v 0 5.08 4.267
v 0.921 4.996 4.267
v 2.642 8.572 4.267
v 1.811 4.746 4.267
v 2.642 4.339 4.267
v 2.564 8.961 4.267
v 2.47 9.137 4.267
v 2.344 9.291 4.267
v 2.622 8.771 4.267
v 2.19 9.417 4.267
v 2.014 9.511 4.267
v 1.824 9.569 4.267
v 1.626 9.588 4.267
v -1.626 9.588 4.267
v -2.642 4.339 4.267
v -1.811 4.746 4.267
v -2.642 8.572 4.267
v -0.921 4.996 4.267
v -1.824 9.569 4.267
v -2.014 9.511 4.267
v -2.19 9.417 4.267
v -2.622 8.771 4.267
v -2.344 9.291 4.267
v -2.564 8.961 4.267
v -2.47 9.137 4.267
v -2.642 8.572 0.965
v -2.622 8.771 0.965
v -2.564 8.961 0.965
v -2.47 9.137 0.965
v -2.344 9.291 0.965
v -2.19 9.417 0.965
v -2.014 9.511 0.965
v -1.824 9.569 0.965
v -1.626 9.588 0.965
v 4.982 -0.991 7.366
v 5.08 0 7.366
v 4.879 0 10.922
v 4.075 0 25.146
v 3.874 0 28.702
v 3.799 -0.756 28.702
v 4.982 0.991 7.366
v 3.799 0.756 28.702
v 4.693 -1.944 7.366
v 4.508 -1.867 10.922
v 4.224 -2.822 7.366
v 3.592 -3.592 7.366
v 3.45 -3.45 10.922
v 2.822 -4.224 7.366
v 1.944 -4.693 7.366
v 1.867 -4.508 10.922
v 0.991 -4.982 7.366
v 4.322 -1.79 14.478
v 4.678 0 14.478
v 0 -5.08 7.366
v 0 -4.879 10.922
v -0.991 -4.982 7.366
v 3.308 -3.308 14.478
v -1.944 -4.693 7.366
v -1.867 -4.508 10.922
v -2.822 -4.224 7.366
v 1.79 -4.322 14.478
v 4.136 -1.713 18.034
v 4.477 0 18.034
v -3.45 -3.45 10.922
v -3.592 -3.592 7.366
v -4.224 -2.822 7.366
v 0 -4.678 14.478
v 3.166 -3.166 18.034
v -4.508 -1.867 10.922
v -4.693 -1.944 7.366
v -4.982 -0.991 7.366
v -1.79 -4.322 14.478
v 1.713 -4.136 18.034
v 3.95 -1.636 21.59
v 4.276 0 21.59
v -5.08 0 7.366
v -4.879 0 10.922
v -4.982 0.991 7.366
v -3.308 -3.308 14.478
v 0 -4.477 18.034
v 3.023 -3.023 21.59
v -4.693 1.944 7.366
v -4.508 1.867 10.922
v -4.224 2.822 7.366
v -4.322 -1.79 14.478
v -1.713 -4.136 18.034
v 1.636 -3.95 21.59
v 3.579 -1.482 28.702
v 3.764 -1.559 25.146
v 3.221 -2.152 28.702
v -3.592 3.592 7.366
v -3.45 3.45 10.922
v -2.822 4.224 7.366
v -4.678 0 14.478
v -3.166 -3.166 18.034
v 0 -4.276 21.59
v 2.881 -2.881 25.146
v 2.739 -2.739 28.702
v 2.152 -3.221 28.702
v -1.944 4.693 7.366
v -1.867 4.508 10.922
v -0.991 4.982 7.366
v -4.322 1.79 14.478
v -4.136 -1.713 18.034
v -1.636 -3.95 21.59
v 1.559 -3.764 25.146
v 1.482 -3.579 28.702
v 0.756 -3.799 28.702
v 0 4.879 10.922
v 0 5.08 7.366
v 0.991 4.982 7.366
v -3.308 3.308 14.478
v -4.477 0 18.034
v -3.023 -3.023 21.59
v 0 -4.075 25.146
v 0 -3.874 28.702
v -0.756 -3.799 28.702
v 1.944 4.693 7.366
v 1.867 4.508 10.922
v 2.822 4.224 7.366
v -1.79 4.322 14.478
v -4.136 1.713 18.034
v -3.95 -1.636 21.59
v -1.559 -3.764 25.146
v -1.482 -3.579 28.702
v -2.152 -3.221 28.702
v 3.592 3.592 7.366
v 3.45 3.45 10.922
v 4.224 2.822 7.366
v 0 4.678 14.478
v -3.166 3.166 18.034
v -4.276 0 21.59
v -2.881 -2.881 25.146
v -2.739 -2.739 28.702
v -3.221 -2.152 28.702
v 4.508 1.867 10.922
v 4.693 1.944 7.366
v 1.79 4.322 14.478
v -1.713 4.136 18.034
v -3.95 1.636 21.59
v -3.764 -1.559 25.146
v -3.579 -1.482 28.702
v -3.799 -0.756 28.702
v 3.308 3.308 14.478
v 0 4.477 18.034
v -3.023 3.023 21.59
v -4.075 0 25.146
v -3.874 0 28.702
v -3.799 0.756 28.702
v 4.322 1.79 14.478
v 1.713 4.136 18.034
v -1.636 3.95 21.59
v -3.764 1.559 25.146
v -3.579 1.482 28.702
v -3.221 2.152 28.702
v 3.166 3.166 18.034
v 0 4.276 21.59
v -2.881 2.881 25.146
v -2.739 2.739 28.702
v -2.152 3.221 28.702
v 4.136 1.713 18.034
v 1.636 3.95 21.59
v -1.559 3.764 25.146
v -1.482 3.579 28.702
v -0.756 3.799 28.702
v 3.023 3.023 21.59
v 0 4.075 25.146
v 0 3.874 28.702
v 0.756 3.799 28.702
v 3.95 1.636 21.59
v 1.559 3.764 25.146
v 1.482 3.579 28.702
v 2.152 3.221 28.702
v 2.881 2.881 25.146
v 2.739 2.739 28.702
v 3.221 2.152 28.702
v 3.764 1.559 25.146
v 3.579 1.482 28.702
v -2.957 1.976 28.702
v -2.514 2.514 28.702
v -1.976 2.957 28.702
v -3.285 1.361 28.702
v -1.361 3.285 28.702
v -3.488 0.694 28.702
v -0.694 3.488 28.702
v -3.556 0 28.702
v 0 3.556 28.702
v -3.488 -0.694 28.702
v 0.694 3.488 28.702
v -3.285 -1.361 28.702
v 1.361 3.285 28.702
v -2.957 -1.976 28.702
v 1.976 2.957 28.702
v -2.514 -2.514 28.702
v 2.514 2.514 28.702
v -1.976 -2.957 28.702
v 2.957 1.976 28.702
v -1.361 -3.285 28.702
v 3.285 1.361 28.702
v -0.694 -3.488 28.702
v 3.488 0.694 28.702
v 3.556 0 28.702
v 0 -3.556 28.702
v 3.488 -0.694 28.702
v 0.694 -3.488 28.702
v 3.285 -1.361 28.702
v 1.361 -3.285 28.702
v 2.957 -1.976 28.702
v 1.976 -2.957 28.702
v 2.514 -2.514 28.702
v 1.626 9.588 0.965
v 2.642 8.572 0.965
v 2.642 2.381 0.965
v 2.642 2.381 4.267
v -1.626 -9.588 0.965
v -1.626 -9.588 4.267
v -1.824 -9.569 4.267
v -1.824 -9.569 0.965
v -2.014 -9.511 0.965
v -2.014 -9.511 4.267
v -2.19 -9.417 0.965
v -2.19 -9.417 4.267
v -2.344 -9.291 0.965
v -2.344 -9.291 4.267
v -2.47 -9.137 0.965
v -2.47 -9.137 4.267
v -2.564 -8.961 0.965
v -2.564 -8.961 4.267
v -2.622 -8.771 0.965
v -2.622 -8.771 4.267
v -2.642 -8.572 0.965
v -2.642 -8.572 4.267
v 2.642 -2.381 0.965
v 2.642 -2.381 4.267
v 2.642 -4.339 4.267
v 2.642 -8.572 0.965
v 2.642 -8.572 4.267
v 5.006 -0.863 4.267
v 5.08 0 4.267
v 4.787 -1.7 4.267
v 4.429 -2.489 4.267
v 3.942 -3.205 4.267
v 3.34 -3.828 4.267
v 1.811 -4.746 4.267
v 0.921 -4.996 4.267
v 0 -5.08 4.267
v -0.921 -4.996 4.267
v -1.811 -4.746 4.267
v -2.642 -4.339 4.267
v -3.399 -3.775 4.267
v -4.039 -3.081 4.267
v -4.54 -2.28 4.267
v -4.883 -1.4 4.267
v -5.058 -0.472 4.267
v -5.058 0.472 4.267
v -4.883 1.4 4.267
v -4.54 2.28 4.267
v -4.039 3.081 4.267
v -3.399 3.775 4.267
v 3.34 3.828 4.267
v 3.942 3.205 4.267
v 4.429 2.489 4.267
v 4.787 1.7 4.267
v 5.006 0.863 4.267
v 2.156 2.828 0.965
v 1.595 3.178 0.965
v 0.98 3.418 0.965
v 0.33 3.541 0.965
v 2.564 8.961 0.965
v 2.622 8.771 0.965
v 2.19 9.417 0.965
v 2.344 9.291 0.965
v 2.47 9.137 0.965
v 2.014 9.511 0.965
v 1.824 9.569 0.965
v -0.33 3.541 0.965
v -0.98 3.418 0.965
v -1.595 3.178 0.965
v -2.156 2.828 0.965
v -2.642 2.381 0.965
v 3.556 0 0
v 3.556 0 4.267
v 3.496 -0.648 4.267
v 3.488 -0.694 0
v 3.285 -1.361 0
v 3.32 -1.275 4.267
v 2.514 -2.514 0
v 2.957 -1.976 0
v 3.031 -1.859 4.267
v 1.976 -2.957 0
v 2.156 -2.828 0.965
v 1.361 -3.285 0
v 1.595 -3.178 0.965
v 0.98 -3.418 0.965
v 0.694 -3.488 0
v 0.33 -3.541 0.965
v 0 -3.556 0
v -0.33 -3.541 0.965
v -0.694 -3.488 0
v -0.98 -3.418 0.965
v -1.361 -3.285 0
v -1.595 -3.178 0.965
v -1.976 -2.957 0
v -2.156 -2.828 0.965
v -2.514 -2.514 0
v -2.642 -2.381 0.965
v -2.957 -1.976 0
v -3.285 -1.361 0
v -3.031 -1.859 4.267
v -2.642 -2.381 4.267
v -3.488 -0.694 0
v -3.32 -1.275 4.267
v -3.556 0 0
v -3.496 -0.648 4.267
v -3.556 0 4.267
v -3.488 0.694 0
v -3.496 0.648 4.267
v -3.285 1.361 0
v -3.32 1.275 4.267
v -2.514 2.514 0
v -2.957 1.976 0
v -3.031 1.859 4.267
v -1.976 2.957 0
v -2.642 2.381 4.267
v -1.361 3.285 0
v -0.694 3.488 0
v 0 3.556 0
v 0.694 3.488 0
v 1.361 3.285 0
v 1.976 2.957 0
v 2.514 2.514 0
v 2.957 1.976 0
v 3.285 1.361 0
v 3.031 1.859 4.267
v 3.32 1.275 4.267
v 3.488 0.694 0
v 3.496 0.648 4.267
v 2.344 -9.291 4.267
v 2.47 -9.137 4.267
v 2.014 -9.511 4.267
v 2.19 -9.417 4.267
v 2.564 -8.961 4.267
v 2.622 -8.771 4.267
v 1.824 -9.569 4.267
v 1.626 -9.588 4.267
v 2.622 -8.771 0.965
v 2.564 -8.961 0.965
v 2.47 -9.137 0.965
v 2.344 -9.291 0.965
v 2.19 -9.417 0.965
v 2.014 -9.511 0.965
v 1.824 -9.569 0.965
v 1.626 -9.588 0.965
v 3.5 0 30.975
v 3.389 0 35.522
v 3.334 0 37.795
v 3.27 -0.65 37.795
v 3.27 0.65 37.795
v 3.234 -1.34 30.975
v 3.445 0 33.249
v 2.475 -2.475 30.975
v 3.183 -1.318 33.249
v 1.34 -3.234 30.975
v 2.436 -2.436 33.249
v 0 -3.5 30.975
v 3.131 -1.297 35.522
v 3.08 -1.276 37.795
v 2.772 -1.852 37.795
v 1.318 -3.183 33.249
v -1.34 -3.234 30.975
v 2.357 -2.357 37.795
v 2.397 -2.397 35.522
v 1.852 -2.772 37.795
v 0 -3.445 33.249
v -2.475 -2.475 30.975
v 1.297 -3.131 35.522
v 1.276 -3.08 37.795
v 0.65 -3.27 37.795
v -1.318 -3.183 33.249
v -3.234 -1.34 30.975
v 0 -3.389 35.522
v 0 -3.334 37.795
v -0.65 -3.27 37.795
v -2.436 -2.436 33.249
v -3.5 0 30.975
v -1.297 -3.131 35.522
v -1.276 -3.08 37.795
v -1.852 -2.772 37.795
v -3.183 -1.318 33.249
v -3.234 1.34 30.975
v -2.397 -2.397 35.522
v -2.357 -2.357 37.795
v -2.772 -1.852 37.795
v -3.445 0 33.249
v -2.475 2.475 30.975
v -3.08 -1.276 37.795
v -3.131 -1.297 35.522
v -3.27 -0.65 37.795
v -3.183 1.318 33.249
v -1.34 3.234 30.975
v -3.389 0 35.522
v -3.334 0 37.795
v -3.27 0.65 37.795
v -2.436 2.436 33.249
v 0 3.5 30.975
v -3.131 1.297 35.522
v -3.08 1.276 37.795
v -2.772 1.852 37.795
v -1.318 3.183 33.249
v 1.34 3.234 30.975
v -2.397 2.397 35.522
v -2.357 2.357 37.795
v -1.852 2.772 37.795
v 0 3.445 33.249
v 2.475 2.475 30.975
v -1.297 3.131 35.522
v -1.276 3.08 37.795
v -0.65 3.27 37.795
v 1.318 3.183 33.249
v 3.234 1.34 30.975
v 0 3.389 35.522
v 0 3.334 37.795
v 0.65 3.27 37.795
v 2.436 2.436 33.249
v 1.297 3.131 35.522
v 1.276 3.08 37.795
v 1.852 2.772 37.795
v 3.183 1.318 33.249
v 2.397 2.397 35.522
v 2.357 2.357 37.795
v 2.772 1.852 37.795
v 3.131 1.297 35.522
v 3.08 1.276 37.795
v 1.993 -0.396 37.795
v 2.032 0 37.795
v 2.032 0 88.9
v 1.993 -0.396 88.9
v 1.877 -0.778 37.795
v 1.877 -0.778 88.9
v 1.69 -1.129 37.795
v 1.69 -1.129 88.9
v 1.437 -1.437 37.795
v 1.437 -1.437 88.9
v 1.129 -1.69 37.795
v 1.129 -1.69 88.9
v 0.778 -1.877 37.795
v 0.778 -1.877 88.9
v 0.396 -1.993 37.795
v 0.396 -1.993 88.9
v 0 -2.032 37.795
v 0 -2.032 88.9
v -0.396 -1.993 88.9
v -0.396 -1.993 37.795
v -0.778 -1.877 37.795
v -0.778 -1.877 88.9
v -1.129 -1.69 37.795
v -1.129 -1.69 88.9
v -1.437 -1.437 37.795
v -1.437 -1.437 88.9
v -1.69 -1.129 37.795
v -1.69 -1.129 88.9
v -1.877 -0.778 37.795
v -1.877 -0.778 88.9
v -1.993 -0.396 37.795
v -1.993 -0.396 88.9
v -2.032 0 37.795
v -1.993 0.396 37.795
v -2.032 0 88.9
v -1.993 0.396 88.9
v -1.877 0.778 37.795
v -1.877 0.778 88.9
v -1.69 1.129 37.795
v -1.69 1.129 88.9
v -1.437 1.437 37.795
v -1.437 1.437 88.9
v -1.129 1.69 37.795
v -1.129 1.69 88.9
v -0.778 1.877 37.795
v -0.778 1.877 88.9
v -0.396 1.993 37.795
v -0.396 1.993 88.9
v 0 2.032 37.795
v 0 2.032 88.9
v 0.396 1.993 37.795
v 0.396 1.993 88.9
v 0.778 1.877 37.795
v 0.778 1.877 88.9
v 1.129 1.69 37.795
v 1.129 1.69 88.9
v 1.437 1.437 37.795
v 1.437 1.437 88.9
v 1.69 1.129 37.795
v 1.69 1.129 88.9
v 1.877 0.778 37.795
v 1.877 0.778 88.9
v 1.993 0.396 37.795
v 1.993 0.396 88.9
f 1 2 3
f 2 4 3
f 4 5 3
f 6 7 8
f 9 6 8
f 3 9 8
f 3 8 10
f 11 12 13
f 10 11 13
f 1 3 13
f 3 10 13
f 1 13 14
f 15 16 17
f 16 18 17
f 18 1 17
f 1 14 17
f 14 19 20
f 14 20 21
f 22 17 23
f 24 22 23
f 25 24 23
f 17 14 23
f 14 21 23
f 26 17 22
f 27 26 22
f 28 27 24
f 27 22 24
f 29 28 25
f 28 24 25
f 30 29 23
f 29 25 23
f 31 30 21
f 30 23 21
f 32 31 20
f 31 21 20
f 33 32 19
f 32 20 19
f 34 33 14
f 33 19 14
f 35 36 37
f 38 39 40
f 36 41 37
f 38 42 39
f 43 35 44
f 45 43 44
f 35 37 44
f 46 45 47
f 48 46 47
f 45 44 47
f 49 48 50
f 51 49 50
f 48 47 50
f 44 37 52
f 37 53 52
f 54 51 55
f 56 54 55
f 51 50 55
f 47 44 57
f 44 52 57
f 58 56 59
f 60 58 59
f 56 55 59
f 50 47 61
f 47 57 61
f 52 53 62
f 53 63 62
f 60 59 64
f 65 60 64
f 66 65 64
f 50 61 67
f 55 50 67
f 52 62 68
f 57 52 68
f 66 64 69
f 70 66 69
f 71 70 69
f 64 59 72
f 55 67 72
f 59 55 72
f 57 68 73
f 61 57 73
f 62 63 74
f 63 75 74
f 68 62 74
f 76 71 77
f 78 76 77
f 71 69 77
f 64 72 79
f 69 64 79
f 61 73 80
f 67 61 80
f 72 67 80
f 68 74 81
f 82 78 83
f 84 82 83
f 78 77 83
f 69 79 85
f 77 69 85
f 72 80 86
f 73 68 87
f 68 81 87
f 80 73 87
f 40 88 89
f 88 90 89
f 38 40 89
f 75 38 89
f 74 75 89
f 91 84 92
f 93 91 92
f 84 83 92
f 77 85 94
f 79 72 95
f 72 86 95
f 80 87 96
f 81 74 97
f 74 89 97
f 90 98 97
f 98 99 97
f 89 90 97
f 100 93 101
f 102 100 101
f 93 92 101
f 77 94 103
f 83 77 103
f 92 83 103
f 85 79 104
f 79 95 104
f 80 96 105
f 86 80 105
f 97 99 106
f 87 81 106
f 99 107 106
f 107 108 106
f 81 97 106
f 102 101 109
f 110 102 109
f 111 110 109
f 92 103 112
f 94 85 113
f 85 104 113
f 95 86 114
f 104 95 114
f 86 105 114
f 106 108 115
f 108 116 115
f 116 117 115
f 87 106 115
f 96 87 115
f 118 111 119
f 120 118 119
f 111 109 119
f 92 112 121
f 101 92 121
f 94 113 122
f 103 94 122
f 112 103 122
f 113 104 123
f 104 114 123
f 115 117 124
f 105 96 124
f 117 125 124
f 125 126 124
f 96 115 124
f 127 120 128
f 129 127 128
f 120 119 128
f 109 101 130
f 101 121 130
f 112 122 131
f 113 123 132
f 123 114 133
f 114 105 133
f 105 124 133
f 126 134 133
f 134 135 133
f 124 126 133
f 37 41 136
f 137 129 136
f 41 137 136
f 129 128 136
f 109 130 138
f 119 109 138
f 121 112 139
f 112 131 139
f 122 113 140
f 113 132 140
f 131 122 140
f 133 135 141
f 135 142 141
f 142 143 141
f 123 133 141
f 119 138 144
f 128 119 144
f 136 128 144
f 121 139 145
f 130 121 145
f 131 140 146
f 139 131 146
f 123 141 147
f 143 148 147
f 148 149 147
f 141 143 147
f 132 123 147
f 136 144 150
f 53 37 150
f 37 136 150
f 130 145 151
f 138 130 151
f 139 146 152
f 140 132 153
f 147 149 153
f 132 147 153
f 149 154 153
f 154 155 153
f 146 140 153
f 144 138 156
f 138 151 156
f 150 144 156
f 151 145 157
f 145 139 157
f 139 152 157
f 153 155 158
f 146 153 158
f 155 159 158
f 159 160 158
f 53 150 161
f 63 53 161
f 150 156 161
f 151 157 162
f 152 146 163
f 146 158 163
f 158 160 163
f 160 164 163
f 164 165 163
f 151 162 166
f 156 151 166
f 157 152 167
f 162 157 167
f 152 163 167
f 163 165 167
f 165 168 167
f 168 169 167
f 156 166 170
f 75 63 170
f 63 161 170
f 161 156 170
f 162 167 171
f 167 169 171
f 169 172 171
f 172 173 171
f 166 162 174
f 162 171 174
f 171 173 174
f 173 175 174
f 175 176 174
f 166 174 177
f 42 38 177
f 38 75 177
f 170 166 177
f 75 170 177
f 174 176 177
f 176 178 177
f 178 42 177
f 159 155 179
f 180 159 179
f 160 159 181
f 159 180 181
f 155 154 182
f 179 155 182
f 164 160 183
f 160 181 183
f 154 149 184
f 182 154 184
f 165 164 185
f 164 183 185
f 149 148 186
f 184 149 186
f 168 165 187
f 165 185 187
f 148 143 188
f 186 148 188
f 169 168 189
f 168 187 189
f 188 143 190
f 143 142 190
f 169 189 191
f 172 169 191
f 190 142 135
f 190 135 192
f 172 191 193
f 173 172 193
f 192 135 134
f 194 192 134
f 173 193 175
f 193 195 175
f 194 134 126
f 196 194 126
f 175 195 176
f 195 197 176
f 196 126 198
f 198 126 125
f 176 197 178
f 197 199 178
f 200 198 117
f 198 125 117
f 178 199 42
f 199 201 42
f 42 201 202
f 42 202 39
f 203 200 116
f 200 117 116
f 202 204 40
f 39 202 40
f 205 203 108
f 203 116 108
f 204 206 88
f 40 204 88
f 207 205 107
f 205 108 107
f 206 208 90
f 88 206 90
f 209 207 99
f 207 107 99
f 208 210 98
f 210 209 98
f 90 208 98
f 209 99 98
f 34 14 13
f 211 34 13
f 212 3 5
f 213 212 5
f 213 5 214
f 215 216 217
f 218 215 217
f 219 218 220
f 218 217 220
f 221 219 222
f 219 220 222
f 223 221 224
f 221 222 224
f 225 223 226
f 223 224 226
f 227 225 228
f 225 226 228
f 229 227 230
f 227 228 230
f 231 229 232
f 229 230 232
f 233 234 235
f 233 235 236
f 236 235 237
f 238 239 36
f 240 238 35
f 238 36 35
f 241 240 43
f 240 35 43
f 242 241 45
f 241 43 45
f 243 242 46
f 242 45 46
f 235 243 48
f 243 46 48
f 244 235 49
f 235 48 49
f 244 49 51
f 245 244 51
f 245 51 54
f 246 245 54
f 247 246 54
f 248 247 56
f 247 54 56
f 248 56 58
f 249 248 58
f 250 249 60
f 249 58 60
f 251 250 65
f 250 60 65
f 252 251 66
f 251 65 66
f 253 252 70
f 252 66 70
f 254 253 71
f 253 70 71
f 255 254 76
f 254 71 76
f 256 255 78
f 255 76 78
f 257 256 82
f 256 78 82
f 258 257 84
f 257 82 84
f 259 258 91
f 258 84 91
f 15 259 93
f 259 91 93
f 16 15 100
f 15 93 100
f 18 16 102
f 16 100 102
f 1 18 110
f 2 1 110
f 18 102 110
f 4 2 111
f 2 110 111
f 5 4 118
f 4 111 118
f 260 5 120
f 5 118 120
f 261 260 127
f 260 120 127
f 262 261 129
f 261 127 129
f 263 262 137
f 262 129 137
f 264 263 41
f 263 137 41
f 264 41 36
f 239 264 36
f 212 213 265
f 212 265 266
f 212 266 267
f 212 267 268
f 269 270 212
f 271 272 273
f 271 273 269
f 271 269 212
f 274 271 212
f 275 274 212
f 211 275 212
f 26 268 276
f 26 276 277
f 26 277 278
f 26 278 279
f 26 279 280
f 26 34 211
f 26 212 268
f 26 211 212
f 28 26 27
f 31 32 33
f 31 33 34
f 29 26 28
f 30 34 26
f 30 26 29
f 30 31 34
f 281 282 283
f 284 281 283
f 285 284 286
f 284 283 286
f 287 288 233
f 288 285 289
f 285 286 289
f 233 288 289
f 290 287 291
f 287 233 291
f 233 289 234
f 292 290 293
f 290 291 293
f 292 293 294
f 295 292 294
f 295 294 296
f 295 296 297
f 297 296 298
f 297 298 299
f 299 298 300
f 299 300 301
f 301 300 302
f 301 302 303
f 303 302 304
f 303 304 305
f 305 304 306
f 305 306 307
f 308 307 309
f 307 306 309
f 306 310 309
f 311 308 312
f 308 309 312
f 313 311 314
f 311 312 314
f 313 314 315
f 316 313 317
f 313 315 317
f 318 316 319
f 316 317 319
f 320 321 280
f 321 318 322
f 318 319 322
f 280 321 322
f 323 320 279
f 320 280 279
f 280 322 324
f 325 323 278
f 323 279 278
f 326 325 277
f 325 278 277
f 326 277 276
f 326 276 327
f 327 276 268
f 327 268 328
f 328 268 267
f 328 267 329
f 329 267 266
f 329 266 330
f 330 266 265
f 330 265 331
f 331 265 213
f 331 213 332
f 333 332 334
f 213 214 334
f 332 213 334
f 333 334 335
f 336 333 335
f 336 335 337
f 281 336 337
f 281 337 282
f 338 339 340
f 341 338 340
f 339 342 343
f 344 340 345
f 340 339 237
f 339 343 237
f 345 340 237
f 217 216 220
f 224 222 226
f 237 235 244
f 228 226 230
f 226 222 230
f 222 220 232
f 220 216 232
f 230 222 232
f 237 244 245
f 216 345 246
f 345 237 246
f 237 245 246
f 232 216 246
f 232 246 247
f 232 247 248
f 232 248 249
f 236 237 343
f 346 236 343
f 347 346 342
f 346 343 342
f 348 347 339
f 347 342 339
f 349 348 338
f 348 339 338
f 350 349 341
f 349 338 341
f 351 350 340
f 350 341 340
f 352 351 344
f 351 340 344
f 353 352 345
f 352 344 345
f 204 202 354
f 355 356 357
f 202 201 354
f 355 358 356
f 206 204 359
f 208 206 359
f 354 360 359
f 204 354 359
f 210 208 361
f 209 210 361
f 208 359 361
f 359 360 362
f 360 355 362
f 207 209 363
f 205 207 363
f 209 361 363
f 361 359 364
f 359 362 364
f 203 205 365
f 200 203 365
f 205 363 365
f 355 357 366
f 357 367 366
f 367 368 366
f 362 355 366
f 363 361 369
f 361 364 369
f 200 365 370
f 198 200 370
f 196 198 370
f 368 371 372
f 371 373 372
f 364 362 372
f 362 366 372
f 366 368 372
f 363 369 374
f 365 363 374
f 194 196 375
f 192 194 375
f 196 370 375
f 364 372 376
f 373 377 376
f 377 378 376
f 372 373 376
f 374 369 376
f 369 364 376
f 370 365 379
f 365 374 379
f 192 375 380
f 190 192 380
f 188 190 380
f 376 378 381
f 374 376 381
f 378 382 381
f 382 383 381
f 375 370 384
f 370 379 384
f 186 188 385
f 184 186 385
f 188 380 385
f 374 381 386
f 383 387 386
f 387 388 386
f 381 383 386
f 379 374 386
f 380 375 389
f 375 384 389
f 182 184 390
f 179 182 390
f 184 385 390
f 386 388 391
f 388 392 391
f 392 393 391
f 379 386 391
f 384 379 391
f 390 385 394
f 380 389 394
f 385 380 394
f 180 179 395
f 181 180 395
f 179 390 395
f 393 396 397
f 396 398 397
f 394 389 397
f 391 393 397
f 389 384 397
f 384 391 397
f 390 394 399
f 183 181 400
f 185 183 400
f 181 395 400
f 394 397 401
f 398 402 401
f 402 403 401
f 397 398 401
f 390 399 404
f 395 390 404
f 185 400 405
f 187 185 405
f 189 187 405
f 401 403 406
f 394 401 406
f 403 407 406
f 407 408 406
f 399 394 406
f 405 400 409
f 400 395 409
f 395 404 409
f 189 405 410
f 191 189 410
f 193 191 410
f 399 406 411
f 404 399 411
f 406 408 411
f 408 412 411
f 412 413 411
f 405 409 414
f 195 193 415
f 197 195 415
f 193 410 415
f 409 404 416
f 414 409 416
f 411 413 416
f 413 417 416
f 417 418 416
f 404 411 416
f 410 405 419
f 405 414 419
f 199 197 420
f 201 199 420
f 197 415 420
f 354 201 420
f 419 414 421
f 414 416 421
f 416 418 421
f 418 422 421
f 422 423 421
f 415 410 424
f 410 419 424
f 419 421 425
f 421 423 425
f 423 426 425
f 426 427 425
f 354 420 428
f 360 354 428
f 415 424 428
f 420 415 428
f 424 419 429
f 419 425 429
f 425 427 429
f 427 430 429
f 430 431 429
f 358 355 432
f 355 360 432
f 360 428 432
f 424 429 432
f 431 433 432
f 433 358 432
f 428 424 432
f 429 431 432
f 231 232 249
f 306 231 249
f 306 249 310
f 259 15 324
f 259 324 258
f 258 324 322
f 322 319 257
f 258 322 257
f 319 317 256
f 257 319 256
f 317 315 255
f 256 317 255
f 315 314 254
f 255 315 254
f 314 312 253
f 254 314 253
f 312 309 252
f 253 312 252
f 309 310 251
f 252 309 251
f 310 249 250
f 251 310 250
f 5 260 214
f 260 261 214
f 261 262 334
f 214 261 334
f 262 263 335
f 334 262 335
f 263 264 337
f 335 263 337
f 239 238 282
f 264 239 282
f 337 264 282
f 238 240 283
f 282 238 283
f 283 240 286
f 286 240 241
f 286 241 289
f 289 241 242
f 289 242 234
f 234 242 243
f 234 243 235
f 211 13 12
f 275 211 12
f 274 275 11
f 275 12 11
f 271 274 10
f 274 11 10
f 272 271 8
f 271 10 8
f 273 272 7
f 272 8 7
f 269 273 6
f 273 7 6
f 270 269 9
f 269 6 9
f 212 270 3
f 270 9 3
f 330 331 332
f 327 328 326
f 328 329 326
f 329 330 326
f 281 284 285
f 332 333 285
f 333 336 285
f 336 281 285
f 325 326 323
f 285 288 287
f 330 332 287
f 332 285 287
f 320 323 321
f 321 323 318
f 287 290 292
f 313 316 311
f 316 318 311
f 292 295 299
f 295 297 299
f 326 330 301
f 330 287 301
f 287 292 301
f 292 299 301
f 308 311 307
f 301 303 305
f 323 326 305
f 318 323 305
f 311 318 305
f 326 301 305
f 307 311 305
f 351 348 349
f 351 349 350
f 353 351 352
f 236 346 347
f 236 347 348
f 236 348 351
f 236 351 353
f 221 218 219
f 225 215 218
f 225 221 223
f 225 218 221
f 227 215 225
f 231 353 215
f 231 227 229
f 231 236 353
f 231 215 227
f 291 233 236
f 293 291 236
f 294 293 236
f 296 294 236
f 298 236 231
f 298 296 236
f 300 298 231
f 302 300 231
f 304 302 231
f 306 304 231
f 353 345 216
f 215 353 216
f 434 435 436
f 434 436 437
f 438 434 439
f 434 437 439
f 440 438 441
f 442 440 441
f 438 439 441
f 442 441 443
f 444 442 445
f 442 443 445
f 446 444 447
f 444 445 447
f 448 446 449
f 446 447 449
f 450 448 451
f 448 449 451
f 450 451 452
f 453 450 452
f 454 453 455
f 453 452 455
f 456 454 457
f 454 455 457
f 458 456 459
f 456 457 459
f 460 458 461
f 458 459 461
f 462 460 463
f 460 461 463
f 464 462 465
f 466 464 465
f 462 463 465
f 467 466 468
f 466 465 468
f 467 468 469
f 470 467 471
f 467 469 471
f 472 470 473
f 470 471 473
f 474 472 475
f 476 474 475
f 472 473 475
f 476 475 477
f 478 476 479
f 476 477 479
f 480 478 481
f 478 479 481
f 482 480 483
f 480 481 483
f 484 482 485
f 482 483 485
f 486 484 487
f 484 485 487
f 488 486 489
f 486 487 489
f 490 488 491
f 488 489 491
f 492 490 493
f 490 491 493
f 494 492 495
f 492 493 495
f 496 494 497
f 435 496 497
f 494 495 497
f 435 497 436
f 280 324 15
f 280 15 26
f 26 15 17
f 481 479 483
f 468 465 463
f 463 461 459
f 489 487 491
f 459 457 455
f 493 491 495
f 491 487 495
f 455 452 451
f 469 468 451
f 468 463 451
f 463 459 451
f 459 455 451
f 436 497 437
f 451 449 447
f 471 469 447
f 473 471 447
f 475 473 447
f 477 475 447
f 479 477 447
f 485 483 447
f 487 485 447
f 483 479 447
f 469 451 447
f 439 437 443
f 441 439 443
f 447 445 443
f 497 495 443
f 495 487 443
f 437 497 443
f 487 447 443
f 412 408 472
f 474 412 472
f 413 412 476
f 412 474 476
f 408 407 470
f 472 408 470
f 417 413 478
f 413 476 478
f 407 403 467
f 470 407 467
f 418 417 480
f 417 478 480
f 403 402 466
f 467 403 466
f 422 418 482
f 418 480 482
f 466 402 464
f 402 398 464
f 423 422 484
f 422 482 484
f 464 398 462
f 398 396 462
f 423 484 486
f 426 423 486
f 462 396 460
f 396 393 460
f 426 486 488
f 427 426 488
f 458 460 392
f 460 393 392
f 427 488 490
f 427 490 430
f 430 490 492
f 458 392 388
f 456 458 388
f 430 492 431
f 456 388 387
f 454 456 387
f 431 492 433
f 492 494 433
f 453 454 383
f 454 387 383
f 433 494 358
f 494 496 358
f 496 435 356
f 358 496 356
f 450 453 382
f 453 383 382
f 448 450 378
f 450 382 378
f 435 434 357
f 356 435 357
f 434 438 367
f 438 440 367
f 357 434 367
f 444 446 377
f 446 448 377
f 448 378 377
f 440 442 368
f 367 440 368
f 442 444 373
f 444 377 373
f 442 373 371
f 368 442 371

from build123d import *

# Parameters (mm, degrees)
BOSS_EXTRUDE1_DEPTH = 3.302


with BuildPart() as part:
    # Sketch2 → Revolve1 (revolve)
    with BuildSketch(Plane(origin=(0, 0, 0), x_dir=(0, 0, -1), z_dir=(1, 0, 0)), mode=Mode.PRIVATE) as revolve1_sk:
        Polygon((0, 3.556), (-4.2672, 3.556), (-4.2672, 5.08), (-7.366, 5.08), (-28.702, 3.8735), (-28.702, 3.556), (-37.7952, 3.33375), (-37.7952, 2.032), (-88.9, 2.032), (-88.9, 0), (0, 0), align=None)
    revolve(revolve1_sk.sketch.rotate(Axis((0, 0, 88.9), (0, 0, -1)), 90), axis=Axis((0, 0, 88.9), (0, 0, -1)))

    # Sketch3 → Boss-Extrude1 (add)
    with BuildSketch(Plane(origin=(0, 0, 4.2672), x_dir=(-1, 0, 0), z_dir=(0, 0, -1))):
        with BuildLine():
            Line((-1.6256, -9.5885), (1.6256, -9.5885))
            ThreePointArc((1.6256, -9.5885), (2.34402049, -9.29092049), (2.6416, -8.5725))
            Line((2.6416, -8.5725), (2.6416, 8.5725))
            ThreePointArc((2.6416, 8.5725), (2.34402049, 9.29092049), (1.6256, 9.5885))
            Line((1.6256, 9.5885), (-1.6256, 9.5885))
            ThreePointArc((-1.6256, 9.5885), (-2.34402049, 9.29092049), (-2.6416, 8.5725))
            Line((-2.6416, 8.5725), (-2.6416, -8.5725))
            ThreePointArc((-2.6416, -8.5725), (-2.34402049, -9.29092049), (-1.6256, -9.5885))
        make_face()
    extrude(amount=BOSS_EXTRUDE1_DEPTH)


solid = part.part
